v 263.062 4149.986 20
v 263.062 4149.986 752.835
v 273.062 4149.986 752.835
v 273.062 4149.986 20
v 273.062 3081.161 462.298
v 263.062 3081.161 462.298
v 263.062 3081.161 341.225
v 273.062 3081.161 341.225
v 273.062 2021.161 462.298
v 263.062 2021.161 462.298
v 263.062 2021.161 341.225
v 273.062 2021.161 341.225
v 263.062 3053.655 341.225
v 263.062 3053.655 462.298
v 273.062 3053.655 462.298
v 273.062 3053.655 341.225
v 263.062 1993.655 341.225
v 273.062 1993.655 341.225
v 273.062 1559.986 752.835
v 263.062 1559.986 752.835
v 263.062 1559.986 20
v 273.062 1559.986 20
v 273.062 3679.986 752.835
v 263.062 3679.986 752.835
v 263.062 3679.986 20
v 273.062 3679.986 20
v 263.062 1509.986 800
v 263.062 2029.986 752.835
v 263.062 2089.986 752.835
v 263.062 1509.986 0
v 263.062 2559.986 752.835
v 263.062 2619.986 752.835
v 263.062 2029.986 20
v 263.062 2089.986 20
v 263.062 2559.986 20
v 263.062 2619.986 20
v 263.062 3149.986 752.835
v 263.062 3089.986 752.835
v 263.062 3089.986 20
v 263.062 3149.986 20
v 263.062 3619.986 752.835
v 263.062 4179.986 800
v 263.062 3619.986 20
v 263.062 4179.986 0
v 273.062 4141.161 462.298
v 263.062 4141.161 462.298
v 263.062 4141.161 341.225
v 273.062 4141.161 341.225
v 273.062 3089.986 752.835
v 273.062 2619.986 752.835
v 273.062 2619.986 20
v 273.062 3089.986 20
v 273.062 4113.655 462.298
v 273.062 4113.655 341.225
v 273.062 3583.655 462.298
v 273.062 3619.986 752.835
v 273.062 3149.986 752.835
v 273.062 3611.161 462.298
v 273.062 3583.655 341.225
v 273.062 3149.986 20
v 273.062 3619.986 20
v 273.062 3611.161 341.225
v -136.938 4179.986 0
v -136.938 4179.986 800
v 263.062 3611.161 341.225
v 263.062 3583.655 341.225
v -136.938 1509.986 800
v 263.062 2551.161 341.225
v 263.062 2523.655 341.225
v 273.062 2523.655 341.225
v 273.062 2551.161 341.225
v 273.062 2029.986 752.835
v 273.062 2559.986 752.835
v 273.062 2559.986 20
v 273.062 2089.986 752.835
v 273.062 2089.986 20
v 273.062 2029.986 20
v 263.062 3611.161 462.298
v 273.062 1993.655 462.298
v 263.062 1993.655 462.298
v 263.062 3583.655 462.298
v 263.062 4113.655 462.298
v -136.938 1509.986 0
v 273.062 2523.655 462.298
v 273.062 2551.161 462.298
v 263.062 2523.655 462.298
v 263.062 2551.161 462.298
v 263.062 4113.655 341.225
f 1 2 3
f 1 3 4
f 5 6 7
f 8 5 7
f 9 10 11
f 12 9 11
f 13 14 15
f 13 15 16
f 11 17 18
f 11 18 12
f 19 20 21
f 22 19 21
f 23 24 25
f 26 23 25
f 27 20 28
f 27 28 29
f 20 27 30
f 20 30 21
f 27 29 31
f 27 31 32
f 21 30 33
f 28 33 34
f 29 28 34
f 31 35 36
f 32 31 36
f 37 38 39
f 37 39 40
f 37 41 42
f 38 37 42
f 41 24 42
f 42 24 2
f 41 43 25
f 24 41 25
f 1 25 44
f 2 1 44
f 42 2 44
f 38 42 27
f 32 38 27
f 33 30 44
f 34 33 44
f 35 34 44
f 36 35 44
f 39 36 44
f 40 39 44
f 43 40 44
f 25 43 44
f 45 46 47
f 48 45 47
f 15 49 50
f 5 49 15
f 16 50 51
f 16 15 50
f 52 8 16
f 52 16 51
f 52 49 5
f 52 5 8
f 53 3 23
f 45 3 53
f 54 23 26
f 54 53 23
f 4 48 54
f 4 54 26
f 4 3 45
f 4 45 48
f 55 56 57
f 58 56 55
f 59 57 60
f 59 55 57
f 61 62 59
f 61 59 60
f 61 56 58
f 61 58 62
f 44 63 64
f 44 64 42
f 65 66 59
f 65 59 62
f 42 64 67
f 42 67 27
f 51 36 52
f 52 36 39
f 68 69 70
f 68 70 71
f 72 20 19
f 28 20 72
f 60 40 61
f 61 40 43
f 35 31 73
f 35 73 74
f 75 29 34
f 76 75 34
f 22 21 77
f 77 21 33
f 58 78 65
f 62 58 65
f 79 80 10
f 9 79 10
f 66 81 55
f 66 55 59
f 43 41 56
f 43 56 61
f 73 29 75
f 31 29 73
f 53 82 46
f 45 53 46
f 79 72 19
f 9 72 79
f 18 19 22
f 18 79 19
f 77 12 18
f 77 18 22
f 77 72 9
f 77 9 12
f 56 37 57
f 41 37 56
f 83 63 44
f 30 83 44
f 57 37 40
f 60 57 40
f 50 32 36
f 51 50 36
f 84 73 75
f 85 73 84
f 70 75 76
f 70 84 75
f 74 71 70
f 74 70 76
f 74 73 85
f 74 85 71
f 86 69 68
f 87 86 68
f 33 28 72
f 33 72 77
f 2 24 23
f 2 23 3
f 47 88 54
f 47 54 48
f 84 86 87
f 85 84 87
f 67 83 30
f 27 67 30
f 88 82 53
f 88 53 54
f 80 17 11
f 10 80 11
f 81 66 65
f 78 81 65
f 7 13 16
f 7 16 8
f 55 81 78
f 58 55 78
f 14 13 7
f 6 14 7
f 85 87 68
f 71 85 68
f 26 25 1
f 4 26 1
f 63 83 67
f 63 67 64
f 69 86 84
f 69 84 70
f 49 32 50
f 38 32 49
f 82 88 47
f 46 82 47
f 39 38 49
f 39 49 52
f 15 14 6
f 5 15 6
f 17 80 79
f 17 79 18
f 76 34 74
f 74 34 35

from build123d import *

# Parameters (mm, degrees)
SKETCH1_W           = 400
SKETCH1_H           = 2670
BOSS_EXTRUDE1_DEPTH = 800
SKETCH3_W           = 732.835133331
SKETCH3_H           = 470
SKETCH3_W_2         = 121.072841775
SKETCH3_H_2         = 27.505181151
BOSS_EXTRUDE3_DEPTH = 10


with BuildPart() as part:
    # Sketch1 → Boss-Extrude1 (new body)
    with BuildSketch(Plane.XY):
        with Locations((63.061970043, 2844.986327315)):
            Rectangle(SKETCH1_W, SKETCH1_H)
    extrude(amount=BOSS_EXTRUDE1_DEPTH)

    # Sketch3 → Boss-Extrude3 (add)
    with BuildSketch(Plane(origin=(263.061970043, 0, 0), x_dir=(0, 0, -1), z_dir=(1, 0, 0))):
        with Locations((-386.417566666, 2324.986327315)):
            Rectangle(SKETCH3_W, SKETCH3_H)
        with Locations((-401.761491339, 2537.407960532)):
            Rectangle(SKETCH3_W_2, SKETCH3_H_2, mode=Mode.SUBTRACT)
        with Locations((-386.417566666, 1794.986327315)):
            Rectangle(SKETCH3_W, SKETCH3_H)
        with Locations((-401.761491339, 2007.407960532)):
            Rectangle(SKETCH3_W_2, SKETCH3_H_2, mode=Mode.SUBTRACT)
        with Locations((-386.417566666, 2854.986327315)):
            Rectangle(SKETCH3_W, SKETCH3_H)
        with Locations((-401.761491339, 3067.407960532)):
            Rectangle(SKETCH3_W_2, SKETCH3_H_2, mode=Mode.SUBTRACT)
        with Locations((-386.417566666, 3384.986327315)):
            Rectangle(SKETCH3_W, SKETCH3_H)
        with Locations((-401.761491339, 3597.407960532)):
            Rectangle(SKETCH3_W_2, SKETCH3_H_2, mode=Mode.SUBTRACT)
        with Locations((-386.417566666, 3914.986327315)):
            Rectangle(SKETCH3_W, SKETCH3_H)
        with Locations((-401.761491339, 4127.407960532)):
            Rectangle(SKETCH3_W_2, SKETCH3_H_2, mode=Mode.SUBTRACT)
    extrude(amount=BOSS_EXTRUDE3_DEPTH)


solid = part.part
